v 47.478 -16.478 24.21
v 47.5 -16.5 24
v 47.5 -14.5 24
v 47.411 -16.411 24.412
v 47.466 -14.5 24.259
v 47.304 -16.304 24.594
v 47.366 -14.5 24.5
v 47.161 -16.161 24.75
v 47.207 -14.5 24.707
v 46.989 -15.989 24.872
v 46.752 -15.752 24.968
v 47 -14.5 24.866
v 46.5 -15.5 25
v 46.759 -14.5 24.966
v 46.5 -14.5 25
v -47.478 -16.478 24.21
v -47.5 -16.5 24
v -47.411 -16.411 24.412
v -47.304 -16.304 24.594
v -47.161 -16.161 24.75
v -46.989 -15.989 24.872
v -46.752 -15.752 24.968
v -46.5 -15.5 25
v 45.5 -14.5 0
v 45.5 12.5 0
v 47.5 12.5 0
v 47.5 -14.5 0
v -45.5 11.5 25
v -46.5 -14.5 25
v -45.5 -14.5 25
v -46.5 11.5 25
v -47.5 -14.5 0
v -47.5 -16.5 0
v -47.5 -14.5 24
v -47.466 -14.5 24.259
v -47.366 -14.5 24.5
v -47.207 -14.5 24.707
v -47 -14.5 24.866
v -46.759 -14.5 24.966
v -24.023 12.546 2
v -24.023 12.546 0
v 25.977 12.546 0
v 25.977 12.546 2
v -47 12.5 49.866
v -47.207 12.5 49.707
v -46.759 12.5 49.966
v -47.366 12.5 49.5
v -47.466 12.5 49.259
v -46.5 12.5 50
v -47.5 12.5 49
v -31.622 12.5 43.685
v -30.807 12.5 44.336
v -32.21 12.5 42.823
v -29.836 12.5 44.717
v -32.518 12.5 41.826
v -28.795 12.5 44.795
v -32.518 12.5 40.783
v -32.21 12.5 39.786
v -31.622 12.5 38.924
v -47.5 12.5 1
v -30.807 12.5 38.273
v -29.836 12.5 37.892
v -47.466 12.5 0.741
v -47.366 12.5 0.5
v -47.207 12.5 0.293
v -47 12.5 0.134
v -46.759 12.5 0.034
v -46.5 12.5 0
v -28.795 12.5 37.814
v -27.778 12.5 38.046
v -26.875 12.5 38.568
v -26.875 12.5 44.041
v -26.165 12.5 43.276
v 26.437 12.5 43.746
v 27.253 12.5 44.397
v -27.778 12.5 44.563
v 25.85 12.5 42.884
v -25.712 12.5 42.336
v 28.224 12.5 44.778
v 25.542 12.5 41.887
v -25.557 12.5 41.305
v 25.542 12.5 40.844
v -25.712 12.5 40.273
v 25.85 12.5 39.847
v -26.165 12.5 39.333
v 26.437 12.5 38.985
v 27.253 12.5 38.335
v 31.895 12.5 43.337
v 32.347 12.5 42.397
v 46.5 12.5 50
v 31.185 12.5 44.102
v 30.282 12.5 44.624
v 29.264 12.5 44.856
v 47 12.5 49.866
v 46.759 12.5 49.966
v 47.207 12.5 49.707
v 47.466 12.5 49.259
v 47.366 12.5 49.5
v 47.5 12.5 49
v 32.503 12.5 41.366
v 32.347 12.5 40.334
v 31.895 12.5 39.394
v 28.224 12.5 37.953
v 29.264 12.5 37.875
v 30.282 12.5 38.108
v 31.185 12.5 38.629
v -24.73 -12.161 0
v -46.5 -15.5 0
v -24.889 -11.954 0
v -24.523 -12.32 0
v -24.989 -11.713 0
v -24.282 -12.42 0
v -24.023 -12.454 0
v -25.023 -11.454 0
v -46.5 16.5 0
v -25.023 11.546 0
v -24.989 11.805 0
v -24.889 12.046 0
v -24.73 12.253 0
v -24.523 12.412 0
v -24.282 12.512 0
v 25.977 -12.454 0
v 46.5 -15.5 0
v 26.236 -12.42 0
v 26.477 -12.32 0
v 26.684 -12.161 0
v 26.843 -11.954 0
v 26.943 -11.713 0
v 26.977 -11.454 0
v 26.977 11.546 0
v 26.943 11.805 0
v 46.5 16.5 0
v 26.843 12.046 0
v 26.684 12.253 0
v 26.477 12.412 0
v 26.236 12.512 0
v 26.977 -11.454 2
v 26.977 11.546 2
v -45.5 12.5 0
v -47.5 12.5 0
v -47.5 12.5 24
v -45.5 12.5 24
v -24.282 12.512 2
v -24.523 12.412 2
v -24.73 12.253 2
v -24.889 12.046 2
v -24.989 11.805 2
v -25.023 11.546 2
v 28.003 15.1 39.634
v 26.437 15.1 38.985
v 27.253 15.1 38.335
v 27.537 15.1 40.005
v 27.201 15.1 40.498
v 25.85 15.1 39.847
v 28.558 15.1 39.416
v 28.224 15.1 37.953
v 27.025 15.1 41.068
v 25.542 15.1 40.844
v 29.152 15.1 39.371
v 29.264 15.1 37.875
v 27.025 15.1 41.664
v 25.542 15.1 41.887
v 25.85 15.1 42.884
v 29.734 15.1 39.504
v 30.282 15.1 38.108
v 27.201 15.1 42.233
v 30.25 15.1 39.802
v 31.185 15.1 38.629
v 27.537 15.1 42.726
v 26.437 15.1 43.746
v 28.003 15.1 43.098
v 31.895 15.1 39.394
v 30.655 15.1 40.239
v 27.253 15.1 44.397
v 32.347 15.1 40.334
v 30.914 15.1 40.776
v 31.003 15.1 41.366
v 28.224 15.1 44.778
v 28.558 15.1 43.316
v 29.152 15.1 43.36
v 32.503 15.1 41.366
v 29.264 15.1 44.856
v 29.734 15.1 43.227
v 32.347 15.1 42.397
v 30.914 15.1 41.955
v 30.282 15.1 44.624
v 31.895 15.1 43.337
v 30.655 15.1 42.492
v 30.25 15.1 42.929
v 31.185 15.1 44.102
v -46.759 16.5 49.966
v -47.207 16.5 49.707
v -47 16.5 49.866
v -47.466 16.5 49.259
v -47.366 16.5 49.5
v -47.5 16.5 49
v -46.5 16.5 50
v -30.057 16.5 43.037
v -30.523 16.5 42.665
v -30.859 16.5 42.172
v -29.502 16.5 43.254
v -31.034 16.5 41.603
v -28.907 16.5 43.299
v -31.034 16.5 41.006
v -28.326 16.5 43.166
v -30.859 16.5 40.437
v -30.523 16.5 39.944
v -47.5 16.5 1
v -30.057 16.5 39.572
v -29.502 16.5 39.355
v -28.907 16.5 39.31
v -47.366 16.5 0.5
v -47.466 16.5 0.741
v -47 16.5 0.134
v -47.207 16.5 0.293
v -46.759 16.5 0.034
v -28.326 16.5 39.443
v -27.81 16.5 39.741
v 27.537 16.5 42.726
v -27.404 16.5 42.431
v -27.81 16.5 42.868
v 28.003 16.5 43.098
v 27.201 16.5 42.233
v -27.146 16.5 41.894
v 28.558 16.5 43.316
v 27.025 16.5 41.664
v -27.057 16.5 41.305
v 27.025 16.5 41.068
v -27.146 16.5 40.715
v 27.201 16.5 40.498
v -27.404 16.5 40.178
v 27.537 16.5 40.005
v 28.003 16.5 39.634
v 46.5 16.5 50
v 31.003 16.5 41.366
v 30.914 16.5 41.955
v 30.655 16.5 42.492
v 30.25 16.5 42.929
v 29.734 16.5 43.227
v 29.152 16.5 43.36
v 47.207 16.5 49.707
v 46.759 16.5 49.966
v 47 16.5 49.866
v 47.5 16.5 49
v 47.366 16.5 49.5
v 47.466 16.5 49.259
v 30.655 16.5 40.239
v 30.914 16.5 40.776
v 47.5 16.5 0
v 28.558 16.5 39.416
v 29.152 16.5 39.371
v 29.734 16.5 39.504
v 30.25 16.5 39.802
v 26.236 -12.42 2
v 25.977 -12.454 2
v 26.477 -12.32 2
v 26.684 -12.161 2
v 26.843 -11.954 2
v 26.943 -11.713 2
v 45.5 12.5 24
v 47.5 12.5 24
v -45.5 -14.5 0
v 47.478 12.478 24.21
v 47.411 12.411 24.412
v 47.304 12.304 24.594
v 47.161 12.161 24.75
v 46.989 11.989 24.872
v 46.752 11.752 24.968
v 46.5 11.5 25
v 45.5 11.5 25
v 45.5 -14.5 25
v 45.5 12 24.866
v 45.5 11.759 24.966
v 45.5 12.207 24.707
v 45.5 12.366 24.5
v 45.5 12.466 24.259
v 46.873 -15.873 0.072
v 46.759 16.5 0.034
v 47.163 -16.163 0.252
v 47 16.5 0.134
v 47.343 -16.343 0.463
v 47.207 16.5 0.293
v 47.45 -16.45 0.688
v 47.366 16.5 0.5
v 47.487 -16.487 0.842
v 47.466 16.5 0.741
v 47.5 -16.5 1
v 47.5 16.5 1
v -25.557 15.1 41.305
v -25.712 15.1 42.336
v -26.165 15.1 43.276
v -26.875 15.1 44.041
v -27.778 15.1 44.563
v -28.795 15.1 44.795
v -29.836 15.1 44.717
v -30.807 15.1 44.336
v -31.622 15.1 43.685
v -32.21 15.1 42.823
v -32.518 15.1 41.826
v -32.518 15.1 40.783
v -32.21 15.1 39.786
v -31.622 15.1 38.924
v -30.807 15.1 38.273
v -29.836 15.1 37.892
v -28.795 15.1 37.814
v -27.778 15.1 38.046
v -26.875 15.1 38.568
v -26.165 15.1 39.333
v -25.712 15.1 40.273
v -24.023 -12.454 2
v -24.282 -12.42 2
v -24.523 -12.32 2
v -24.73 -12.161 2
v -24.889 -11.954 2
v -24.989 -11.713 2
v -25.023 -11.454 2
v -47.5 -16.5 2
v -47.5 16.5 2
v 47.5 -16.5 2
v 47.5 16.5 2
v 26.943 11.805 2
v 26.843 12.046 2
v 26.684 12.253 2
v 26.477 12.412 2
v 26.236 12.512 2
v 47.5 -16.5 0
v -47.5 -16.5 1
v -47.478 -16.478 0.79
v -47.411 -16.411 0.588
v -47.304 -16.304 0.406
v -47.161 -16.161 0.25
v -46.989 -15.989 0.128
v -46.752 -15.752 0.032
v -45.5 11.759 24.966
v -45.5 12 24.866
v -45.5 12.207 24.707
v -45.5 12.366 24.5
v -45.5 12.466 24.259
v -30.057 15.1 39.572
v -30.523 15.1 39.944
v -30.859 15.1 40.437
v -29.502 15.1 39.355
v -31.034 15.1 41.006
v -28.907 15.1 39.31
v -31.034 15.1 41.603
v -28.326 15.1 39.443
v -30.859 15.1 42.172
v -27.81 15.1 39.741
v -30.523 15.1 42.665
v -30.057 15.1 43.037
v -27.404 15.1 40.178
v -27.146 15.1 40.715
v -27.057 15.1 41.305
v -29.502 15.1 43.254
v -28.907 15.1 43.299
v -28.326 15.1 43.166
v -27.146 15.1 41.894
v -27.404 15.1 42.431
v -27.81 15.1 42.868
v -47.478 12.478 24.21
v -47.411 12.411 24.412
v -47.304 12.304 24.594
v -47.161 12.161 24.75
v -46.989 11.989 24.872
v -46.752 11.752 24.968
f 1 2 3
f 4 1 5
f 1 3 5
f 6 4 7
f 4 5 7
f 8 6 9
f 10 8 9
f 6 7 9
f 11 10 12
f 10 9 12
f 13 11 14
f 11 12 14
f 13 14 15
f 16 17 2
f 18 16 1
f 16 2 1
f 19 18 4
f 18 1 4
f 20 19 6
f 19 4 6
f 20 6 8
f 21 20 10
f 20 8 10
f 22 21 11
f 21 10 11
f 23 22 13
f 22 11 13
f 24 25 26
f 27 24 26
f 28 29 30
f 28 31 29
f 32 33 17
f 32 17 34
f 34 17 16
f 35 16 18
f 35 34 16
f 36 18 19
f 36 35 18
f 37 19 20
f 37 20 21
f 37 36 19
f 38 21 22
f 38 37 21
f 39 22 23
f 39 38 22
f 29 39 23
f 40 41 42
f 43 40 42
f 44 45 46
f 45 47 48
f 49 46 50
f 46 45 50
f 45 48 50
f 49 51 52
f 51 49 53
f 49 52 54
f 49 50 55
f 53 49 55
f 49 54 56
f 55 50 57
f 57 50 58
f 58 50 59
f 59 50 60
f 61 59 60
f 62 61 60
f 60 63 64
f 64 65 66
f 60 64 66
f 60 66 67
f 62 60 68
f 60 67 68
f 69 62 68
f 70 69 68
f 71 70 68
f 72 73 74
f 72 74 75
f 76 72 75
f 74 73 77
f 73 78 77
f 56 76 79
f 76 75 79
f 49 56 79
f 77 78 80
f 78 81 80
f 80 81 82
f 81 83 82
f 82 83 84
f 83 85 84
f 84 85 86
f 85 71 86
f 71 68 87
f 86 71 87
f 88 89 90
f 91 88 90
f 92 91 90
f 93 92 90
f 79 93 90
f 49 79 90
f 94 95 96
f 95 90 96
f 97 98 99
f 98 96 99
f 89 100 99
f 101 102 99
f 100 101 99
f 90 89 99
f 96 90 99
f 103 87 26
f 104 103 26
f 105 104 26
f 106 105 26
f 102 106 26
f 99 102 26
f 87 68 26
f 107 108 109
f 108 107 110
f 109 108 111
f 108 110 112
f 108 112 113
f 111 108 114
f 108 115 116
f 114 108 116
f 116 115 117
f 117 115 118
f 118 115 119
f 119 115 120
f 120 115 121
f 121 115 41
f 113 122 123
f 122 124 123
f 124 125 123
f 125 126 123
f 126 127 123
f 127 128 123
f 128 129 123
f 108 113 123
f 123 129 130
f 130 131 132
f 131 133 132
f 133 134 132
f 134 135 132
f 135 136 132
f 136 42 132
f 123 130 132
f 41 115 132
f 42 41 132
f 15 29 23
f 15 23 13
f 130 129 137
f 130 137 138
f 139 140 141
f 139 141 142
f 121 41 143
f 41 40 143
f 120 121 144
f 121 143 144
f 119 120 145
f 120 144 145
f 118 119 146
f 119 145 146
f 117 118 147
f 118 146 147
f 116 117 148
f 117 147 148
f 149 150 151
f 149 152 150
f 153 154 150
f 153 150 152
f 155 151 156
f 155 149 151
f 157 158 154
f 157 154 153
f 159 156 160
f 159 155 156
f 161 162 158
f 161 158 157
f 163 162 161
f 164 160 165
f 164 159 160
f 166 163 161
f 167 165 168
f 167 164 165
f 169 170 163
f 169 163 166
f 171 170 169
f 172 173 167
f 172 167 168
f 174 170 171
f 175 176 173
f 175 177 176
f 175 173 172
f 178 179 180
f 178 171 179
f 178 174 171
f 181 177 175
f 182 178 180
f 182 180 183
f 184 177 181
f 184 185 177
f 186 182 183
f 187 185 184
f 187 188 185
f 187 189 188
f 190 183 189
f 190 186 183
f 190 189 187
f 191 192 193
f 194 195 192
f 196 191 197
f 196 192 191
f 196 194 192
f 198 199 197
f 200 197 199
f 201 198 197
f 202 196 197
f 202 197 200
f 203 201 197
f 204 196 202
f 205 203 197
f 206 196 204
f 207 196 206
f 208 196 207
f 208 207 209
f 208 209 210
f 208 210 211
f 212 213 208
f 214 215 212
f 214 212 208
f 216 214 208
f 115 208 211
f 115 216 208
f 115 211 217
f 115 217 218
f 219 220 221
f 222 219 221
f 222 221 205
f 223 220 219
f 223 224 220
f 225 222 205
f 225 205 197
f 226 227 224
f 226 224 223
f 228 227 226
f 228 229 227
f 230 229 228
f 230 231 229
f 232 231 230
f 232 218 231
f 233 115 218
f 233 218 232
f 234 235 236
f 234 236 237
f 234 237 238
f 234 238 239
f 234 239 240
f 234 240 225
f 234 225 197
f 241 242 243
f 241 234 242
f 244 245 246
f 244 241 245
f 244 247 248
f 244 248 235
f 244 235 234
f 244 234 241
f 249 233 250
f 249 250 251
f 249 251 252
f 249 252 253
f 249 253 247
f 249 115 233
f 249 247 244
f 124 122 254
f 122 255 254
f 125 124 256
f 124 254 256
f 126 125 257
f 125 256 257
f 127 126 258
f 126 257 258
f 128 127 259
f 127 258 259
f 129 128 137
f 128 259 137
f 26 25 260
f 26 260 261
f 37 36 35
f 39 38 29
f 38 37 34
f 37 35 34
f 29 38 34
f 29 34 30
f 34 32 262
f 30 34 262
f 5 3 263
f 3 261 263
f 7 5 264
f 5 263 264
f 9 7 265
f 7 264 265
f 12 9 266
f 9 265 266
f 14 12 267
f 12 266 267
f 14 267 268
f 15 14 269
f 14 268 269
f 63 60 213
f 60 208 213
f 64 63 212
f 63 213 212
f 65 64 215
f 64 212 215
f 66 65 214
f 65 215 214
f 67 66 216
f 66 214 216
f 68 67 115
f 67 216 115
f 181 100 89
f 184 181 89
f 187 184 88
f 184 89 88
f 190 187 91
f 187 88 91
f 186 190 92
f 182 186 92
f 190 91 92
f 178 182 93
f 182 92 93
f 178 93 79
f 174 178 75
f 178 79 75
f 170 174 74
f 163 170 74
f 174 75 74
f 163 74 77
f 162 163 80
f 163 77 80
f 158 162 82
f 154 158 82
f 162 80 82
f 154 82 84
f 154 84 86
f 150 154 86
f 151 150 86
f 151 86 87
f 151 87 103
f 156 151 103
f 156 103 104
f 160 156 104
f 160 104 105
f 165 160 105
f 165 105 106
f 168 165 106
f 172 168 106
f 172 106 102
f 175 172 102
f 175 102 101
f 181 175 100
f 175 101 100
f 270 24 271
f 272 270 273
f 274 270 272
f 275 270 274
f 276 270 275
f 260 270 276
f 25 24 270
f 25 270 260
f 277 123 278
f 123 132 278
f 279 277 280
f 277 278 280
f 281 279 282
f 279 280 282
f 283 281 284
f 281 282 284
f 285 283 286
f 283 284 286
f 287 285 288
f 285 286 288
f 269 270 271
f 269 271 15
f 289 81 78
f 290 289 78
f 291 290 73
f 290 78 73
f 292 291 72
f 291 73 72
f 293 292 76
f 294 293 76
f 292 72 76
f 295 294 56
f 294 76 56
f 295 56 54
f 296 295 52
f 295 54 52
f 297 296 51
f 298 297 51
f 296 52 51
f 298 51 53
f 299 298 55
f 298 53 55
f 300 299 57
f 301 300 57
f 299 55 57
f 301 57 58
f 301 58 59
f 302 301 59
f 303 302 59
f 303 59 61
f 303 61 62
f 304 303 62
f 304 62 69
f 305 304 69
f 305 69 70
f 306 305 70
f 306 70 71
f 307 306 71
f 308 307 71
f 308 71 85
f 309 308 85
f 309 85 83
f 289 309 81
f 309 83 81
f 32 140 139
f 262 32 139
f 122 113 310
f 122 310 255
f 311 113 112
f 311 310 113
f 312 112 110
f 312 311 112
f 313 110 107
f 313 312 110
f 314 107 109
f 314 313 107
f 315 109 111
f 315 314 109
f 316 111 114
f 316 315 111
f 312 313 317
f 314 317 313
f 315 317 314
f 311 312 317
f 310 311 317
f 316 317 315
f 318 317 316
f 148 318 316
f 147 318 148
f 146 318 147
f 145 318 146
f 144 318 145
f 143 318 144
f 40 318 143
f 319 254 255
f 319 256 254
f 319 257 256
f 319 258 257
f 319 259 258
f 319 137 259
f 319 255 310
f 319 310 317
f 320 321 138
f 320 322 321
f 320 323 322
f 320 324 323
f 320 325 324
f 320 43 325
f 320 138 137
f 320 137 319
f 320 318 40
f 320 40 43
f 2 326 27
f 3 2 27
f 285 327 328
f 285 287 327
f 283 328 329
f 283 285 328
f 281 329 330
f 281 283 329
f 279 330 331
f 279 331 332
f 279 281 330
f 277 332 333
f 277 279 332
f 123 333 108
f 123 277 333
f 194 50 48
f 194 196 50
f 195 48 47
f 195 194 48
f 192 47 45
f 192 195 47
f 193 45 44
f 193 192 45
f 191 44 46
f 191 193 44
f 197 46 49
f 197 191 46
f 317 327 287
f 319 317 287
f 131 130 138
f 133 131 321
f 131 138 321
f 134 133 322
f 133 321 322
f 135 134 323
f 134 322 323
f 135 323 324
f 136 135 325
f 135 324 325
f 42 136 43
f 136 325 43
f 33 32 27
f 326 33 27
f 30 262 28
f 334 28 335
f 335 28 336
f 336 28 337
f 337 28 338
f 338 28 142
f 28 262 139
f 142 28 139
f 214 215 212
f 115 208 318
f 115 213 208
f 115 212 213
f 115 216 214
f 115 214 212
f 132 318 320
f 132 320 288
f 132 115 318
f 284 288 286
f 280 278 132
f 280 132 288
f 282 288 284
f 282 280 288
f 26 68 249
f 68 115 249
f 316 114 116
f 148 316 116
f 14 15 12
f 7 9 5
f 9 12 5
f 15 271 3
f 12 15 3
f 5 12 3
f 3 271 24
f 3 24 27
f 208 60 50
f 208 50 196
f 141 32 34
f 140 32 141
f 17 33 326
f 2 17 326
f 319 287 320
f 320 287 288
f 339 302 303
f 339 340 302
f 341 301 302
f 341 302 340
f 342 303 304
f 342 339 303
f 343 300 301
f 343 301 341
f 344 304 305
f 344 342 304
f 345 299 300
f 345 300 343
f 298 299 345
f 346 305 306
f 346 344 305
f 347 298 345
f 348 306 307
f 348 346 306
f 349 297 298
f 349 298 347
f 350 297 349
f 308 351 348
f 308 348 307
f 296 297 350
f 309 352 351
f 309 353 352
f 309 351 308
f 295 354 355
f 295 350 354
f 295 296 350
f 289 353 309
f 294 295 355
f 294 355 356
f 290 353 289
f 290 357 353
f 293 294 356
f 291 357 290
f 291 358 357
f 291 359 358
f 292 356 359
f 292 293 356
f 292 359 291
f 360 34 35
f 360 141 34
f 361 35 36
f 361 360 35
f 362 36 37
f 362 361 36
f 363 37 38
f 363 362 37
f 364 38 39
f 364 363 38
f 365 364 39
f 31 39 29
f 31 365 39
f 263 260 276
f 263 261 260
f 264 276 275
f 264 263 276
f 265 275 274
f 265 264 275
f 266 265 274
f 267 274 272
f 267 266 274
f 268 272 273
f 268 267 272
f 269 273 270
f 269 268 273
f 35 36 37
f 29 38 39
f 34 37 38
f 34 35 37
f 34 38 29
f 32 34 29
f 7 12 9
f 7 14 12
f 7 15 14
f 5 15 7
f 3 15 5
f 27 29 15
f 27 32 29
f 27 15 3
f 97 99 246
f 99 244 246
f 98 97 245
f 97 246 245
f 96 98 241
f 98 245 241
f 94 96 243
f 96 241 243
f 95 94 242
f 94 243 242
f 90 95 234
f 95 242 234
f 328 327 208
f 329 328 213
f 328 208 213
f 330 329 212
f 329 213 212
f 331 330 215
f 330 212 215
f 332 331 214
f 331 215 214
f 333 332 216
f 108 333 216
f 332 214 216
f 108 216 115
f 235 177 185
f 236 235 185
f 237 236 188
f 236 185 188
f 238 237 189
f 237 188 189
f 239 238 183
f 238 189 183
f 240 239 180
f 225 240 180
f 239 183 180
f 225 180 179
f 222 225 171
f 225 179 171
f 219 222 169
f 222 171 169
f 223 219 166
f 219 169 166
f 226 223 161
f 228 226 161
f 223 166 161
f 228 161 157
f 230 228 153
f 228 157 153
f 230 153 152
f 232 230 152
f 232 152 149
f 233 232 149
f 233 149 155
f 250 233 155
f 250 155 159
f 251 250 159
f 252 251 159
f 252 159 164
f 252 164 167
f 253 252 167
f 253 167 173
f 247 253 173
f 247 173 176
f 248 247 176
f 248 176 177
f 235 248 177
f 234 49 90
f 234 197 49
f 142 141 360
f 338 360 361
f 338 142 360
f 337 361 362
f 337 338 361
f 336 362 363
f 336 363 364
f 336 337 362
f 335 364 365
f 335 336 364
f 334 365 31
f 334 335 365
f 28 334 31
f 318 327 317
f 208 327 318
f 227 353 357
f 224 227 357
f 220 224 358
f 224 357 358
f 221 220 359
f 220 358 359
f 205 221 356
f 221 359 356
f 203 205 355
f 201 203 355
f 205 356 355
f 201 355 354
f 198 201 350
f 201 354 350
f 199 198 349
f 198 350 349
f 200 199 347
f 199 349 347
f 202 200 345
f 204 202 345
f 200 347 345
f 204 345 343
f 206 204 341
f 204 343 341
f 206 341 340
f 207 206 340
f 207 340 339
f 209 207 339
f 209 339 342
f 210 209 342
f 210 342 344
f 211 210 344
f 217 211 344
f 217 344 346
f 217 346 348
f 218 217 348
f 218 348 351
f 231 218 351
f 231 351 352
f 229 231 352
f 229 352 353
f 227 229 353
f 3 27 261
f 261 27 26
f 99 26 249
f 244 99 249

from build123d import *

# Parameters (mm, degrees)
F0_W      = 95
F0_H      = 33
F1_DEPTH  = 2
F4_W      = 95
F4_H      = 2
F7_DEPTH  = 25
F5_W      = 2
F5_H      = 27
F6_W      = 2
F6_H      = 27
F3_W      = 95
F3_H      = 4
F8_DEPTH  = 50
F2_W      = 52
F2_H      = 25
F9_DEPTH  = 6
F10_R     = 1
F10_2_R   = 1
F10_3_R   = 1
F10_4_R   = 1
F10_5_R   = 1
F11_R     = 2
F12_DEPTH = 4
F13_R     = 3.5
F14_DEPTH = 2.6


with BuildPart() as f1:
    # F0 (on Top) → F1 (new body)
    with BuildSketch(Plane.XY):
        Rectangle(F0_W, F0_H)
    extrude(amount=F1_DEPTH)

    # F2 (on face) → F9 (cut)
    with BuildSketch(Plane.XY):
        with Locations((0.9772641808, 0.0461841002)):
            Rectangle(F2_W, F2_H)
    extrude(amount=F9_DEPTH, mode=Mode.SUBTRACT)

    # F10
    f10_edges = [f1.edges().sort_by_distance(p)[0] for p in [
        (-47.5, 0, 0),
        (47.5, 0, 0),
        (0, -16.5, 0),
        (-25.022736, -12.453816, 1),
        (26.977264, -12.453816, 1),
        (26.977264, 12.546184, 1),
        (-25.022736, 12.546184, 1),
    ]]
    fillet(f10_edges, radius=F10_R)


with BuildPart() as f7:
    # F4 (on face) → F7 (new body)
    with BuildSketch(Plane.XY):
        with Locations((0, -15.5)):
            Rectangle(F4_W, F4_H)
    extrude(amount=F7_DEPTH)

    # F10#2
    f10_2_edges = [f7.edges().sort_by_distance(p)[0] for p in [
        (0, -16.5, 25),
        (-47.5, -15.5, 25),
        (47.5, -15.5, 25),
    ]]
    fillet(f10_2_edges, radius=F10_2_R)


with BuildPart() as f7b:
    # F5 (on face) → F7, piece 2 (new body)
    with BuildSketch(Plane.XY):
        with Locations((-46.5, -1)):
            Rectangle(F5_W, F5_H)
    extrude(amount=F7_DEPTH)

    # F10#3
    f10_3_edges = [f7b.edges().sort_by_distance(p)[0] for p in [
        (-46.5, 12.5, 25),
        (-47.5, -1, 25),
    ]]
    fillet(f10_3_edges, radius=F10_3_R)


with BuildPart() as f7c:
    # F6 (on face) → F7, piece 3 (new body)
    with BuildSketch(Plane.XY):
        with Locations((46.5, -1)):
            Rectangle(F6_W, F6_H)
    extrude(amount=F7_DEPTH)

    # F10#4
    f10_4_edges = [f7c.edges().sort_by_distance(p)[0] for p in [
        (46.5, 12.5, 25),
        (47.5, -1, 25),
    ]]
    fillet(f10_4_edges, radius=F10_4_R)


with BuildPart() as f8:
    # F3 (on face) → F8 (new body)
    with BuildSketch(Plane.XY):
        with Locations((0, 14.5)):
            Rectangle(F3_W, F3_H)
    extrude(amount=F8_DEPTH)

    # F10#5
    f10_5_edges = [f8.edges().sort_by_distance(p)[0] for p in [
        (47.5, 14.5, 50),
        (-47.5, 14.5, 50),
        (-47.5, 14.5, 0),
    ]]
    fillet(f10_5_edges, radius=F10_5_R)

    # F11 (on face) → F12 (cut)
    with BuildSketch(Plane.XZ.offset(-12.5)):
        with Locations((-29.0568154305, 41.3045398891)):
            Circle(F11_R)
        with Locations((29.0029011667, 41.3656570017)):
            Circle(F11_R)
    extrude(amount=-F12_DEPTH, mode=Mode.SUBTRACT)

    # F13 (on face) → F14 (cut)
    with BuildSketch(Plane.XZ.offset(-12.5)):
        with Locations((-29.0568154305, 41.3045398891)):
            Circle(F13_R)
        with Locations((29.0029011667, 41.3656570017)):
            Circle(F13_R)
    extrude(amount=-F14_DEPTH, mode=Mode.SUBTRACT)


solid = Compound([f1.part, f7.part, f7b.part, f7c.part, f8.part])
